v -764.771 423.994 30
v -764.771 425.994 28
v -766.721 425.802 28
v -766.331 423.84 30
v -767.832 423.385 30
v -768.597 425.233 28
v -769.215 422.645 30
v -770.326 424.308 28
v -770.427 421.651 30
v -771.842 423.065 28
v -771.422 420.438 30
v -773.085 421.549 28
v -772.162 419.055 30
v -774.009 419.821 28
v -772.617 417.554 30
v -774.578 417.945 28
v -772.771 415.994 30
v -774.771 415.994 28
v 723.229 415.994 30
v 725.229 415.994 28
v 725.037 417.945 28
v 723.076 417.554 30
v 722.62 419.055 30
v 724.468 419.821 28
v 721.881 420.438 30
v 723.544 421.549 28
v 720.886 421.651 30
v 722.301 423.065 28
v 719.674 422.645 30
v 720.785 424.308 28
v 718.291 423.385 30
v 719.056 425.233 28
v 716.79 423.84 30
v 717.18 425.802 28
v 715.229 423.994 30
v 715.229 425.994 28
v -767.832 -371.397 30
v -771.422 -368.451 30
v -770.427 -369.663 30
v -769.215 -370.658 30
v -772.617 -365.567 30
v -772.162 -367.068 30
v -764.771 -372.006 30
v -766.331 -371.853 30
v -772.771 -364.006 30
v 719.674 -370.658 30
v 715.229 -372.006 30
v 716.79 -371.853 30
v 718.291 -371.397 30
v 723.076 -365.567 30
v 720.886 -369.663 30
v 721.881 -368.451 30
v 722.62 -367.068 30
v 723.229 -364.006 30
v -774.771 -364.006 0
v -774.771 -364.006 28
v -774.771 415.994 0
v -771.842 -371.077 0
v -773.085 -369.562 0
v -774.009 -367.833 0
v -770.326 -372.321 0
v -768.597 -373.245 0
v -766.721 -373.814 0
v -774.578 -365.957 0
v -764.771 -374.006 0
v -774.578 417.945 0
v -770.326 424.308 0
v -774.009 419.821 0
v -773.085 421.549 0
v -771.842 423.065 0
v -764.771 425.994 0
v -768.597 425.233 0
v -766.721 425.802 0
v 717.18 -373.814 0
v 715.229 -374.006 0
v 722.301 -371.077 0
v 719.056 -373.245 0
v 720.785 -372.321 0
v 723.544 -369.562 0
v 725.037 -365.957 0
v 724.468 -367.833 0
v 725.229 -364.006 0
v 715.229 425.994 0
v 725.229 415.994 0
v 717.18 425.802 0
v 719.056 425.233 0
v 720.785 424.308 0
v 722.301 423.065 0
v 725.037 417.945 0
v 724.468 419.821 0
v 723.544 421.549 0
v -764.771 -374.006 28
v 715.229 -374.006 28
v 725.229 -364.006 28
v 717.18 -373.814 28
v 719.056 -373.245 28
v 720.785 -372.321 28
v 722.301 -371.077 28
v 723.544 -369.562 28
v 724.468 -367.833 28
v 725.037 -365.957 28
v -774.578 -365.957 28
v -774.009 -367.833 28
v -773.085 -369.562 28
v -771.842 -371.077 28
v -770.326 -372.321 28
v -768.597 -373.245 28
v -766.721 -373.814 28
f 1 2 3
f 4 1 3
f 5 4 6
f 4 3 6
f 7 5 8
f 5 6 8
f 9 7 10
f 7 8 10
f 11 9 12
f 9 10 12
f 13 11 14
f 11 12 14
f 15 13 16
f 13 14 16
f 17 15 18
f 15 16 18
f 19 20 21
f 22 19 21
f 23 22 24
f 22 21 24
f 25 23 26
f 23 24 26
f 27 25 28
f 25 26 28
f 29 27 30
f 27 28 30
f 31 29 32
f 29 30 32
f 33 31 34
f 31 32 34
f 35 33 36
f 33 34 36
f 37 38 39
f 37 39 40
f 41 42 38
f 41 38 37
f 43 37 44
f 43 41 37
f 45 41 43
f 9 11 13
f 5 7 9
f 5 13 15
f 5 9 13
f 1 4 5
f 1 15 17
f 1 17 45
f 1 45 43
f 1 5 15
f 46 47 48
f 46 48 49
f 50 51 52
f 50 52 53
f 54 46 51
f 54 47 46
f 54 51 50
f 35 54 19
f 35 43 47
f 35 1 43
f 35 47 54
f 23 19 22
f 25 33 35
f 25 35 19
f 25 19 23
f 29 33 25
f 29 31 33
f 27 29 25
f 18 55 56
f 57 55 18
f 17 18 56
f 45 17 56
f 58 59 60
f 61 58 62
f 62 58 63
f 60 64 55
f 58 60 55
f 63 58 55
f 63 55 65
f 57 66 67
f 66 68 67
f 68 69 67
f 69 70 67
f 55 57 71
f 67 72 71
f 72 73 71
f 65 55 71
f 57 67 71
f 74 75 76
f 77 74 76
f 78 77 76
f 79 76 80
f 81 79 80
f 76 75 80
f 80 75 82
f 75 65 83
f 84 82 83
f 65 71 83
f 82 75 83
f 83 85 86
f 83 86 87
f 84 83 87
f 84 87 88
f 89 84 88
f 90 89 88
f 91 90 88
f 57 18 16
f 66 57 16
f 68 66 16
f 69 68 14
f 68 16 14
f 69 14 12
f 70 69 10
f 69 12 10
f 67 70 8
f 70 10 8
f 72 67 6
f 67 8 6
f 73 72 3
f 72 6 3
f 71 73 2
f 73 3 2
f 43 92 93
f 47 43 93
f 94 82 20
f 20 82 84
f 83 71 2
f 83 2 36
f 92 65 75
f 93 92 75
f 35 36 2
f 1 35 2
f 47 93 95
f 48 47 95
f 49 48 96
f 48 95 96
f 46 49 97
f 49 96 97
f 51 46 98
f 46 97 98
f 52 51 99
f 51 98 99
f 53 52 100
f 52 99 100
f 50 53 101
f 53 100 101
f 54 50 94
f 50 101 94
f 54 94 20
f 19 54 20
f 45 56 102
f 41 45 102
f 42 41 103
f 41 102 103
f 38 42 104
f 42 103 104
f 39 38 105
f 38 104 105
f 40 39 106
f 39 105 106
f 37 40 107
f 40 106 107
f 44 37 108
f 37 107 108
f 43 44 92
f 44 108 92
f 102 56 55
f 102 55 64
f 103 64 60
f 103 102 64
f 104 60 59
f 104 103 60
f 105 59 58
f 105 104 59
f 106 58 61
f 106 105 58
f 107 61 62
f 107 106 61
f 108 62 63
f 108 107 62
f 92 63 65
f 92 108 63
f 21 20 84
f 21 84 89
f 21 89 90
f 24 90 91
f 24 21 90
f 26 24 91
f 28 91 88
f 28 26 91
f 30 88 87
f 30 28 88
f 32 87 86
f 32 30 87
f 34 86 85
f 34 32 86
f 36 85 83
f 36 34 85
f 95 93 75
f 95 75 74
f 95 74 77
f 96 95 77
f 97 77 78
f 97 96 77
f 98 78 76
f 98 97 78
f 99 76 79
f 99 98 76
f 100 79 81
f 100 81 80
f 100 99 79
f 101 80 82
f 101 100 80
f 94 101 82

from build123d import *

# Parameters (mm, degrees)
F0_W     = 1500
F0_H     = 800
F1_DEPTH = 30
F2_R     = 10
F3_SIZE  = 2


with BuildPart() as f1:
    # F0 (on Top) → F1 (new body)
    with BuildSketch(Plane.XY):
        with Locations((-24.770537, 25.993737)):
            Rectangle(F0_W, F0_H)
    extrude(amount=F1_DEPTH)

    # F2
    f2_edges = [f1.edges().sort_by_distance(p)[0] for p in [
        (725.229463, -374.006263, 15),
        (725.229463, 425.993737, 15),
        (-774.770537, -374.006263, 15),
        (-774.770537, 425.993737, 15),
    ]]
    fillet(f2_edges, radius=F2_R)

    # F3
    f3_edges = [f1.edges().sort_by_distance(p)[0] for p in [
        (725.229463, 25.993737, 30),
        (722.30053, -371.07733, 30),
        (722.30053, 423.064805, 30),
        (-24.770537, -374.006263, 30),
        (-24.770537, 425.993737, 30),
        (-771.841605, -371.07733, 30),
        (-771.841605, 423.064805, 30),
        (-774.770537, 25.993737, 30),
    ]]
    chamfer(f3_edges, length=F3_SIZE)


solid = f1.part
